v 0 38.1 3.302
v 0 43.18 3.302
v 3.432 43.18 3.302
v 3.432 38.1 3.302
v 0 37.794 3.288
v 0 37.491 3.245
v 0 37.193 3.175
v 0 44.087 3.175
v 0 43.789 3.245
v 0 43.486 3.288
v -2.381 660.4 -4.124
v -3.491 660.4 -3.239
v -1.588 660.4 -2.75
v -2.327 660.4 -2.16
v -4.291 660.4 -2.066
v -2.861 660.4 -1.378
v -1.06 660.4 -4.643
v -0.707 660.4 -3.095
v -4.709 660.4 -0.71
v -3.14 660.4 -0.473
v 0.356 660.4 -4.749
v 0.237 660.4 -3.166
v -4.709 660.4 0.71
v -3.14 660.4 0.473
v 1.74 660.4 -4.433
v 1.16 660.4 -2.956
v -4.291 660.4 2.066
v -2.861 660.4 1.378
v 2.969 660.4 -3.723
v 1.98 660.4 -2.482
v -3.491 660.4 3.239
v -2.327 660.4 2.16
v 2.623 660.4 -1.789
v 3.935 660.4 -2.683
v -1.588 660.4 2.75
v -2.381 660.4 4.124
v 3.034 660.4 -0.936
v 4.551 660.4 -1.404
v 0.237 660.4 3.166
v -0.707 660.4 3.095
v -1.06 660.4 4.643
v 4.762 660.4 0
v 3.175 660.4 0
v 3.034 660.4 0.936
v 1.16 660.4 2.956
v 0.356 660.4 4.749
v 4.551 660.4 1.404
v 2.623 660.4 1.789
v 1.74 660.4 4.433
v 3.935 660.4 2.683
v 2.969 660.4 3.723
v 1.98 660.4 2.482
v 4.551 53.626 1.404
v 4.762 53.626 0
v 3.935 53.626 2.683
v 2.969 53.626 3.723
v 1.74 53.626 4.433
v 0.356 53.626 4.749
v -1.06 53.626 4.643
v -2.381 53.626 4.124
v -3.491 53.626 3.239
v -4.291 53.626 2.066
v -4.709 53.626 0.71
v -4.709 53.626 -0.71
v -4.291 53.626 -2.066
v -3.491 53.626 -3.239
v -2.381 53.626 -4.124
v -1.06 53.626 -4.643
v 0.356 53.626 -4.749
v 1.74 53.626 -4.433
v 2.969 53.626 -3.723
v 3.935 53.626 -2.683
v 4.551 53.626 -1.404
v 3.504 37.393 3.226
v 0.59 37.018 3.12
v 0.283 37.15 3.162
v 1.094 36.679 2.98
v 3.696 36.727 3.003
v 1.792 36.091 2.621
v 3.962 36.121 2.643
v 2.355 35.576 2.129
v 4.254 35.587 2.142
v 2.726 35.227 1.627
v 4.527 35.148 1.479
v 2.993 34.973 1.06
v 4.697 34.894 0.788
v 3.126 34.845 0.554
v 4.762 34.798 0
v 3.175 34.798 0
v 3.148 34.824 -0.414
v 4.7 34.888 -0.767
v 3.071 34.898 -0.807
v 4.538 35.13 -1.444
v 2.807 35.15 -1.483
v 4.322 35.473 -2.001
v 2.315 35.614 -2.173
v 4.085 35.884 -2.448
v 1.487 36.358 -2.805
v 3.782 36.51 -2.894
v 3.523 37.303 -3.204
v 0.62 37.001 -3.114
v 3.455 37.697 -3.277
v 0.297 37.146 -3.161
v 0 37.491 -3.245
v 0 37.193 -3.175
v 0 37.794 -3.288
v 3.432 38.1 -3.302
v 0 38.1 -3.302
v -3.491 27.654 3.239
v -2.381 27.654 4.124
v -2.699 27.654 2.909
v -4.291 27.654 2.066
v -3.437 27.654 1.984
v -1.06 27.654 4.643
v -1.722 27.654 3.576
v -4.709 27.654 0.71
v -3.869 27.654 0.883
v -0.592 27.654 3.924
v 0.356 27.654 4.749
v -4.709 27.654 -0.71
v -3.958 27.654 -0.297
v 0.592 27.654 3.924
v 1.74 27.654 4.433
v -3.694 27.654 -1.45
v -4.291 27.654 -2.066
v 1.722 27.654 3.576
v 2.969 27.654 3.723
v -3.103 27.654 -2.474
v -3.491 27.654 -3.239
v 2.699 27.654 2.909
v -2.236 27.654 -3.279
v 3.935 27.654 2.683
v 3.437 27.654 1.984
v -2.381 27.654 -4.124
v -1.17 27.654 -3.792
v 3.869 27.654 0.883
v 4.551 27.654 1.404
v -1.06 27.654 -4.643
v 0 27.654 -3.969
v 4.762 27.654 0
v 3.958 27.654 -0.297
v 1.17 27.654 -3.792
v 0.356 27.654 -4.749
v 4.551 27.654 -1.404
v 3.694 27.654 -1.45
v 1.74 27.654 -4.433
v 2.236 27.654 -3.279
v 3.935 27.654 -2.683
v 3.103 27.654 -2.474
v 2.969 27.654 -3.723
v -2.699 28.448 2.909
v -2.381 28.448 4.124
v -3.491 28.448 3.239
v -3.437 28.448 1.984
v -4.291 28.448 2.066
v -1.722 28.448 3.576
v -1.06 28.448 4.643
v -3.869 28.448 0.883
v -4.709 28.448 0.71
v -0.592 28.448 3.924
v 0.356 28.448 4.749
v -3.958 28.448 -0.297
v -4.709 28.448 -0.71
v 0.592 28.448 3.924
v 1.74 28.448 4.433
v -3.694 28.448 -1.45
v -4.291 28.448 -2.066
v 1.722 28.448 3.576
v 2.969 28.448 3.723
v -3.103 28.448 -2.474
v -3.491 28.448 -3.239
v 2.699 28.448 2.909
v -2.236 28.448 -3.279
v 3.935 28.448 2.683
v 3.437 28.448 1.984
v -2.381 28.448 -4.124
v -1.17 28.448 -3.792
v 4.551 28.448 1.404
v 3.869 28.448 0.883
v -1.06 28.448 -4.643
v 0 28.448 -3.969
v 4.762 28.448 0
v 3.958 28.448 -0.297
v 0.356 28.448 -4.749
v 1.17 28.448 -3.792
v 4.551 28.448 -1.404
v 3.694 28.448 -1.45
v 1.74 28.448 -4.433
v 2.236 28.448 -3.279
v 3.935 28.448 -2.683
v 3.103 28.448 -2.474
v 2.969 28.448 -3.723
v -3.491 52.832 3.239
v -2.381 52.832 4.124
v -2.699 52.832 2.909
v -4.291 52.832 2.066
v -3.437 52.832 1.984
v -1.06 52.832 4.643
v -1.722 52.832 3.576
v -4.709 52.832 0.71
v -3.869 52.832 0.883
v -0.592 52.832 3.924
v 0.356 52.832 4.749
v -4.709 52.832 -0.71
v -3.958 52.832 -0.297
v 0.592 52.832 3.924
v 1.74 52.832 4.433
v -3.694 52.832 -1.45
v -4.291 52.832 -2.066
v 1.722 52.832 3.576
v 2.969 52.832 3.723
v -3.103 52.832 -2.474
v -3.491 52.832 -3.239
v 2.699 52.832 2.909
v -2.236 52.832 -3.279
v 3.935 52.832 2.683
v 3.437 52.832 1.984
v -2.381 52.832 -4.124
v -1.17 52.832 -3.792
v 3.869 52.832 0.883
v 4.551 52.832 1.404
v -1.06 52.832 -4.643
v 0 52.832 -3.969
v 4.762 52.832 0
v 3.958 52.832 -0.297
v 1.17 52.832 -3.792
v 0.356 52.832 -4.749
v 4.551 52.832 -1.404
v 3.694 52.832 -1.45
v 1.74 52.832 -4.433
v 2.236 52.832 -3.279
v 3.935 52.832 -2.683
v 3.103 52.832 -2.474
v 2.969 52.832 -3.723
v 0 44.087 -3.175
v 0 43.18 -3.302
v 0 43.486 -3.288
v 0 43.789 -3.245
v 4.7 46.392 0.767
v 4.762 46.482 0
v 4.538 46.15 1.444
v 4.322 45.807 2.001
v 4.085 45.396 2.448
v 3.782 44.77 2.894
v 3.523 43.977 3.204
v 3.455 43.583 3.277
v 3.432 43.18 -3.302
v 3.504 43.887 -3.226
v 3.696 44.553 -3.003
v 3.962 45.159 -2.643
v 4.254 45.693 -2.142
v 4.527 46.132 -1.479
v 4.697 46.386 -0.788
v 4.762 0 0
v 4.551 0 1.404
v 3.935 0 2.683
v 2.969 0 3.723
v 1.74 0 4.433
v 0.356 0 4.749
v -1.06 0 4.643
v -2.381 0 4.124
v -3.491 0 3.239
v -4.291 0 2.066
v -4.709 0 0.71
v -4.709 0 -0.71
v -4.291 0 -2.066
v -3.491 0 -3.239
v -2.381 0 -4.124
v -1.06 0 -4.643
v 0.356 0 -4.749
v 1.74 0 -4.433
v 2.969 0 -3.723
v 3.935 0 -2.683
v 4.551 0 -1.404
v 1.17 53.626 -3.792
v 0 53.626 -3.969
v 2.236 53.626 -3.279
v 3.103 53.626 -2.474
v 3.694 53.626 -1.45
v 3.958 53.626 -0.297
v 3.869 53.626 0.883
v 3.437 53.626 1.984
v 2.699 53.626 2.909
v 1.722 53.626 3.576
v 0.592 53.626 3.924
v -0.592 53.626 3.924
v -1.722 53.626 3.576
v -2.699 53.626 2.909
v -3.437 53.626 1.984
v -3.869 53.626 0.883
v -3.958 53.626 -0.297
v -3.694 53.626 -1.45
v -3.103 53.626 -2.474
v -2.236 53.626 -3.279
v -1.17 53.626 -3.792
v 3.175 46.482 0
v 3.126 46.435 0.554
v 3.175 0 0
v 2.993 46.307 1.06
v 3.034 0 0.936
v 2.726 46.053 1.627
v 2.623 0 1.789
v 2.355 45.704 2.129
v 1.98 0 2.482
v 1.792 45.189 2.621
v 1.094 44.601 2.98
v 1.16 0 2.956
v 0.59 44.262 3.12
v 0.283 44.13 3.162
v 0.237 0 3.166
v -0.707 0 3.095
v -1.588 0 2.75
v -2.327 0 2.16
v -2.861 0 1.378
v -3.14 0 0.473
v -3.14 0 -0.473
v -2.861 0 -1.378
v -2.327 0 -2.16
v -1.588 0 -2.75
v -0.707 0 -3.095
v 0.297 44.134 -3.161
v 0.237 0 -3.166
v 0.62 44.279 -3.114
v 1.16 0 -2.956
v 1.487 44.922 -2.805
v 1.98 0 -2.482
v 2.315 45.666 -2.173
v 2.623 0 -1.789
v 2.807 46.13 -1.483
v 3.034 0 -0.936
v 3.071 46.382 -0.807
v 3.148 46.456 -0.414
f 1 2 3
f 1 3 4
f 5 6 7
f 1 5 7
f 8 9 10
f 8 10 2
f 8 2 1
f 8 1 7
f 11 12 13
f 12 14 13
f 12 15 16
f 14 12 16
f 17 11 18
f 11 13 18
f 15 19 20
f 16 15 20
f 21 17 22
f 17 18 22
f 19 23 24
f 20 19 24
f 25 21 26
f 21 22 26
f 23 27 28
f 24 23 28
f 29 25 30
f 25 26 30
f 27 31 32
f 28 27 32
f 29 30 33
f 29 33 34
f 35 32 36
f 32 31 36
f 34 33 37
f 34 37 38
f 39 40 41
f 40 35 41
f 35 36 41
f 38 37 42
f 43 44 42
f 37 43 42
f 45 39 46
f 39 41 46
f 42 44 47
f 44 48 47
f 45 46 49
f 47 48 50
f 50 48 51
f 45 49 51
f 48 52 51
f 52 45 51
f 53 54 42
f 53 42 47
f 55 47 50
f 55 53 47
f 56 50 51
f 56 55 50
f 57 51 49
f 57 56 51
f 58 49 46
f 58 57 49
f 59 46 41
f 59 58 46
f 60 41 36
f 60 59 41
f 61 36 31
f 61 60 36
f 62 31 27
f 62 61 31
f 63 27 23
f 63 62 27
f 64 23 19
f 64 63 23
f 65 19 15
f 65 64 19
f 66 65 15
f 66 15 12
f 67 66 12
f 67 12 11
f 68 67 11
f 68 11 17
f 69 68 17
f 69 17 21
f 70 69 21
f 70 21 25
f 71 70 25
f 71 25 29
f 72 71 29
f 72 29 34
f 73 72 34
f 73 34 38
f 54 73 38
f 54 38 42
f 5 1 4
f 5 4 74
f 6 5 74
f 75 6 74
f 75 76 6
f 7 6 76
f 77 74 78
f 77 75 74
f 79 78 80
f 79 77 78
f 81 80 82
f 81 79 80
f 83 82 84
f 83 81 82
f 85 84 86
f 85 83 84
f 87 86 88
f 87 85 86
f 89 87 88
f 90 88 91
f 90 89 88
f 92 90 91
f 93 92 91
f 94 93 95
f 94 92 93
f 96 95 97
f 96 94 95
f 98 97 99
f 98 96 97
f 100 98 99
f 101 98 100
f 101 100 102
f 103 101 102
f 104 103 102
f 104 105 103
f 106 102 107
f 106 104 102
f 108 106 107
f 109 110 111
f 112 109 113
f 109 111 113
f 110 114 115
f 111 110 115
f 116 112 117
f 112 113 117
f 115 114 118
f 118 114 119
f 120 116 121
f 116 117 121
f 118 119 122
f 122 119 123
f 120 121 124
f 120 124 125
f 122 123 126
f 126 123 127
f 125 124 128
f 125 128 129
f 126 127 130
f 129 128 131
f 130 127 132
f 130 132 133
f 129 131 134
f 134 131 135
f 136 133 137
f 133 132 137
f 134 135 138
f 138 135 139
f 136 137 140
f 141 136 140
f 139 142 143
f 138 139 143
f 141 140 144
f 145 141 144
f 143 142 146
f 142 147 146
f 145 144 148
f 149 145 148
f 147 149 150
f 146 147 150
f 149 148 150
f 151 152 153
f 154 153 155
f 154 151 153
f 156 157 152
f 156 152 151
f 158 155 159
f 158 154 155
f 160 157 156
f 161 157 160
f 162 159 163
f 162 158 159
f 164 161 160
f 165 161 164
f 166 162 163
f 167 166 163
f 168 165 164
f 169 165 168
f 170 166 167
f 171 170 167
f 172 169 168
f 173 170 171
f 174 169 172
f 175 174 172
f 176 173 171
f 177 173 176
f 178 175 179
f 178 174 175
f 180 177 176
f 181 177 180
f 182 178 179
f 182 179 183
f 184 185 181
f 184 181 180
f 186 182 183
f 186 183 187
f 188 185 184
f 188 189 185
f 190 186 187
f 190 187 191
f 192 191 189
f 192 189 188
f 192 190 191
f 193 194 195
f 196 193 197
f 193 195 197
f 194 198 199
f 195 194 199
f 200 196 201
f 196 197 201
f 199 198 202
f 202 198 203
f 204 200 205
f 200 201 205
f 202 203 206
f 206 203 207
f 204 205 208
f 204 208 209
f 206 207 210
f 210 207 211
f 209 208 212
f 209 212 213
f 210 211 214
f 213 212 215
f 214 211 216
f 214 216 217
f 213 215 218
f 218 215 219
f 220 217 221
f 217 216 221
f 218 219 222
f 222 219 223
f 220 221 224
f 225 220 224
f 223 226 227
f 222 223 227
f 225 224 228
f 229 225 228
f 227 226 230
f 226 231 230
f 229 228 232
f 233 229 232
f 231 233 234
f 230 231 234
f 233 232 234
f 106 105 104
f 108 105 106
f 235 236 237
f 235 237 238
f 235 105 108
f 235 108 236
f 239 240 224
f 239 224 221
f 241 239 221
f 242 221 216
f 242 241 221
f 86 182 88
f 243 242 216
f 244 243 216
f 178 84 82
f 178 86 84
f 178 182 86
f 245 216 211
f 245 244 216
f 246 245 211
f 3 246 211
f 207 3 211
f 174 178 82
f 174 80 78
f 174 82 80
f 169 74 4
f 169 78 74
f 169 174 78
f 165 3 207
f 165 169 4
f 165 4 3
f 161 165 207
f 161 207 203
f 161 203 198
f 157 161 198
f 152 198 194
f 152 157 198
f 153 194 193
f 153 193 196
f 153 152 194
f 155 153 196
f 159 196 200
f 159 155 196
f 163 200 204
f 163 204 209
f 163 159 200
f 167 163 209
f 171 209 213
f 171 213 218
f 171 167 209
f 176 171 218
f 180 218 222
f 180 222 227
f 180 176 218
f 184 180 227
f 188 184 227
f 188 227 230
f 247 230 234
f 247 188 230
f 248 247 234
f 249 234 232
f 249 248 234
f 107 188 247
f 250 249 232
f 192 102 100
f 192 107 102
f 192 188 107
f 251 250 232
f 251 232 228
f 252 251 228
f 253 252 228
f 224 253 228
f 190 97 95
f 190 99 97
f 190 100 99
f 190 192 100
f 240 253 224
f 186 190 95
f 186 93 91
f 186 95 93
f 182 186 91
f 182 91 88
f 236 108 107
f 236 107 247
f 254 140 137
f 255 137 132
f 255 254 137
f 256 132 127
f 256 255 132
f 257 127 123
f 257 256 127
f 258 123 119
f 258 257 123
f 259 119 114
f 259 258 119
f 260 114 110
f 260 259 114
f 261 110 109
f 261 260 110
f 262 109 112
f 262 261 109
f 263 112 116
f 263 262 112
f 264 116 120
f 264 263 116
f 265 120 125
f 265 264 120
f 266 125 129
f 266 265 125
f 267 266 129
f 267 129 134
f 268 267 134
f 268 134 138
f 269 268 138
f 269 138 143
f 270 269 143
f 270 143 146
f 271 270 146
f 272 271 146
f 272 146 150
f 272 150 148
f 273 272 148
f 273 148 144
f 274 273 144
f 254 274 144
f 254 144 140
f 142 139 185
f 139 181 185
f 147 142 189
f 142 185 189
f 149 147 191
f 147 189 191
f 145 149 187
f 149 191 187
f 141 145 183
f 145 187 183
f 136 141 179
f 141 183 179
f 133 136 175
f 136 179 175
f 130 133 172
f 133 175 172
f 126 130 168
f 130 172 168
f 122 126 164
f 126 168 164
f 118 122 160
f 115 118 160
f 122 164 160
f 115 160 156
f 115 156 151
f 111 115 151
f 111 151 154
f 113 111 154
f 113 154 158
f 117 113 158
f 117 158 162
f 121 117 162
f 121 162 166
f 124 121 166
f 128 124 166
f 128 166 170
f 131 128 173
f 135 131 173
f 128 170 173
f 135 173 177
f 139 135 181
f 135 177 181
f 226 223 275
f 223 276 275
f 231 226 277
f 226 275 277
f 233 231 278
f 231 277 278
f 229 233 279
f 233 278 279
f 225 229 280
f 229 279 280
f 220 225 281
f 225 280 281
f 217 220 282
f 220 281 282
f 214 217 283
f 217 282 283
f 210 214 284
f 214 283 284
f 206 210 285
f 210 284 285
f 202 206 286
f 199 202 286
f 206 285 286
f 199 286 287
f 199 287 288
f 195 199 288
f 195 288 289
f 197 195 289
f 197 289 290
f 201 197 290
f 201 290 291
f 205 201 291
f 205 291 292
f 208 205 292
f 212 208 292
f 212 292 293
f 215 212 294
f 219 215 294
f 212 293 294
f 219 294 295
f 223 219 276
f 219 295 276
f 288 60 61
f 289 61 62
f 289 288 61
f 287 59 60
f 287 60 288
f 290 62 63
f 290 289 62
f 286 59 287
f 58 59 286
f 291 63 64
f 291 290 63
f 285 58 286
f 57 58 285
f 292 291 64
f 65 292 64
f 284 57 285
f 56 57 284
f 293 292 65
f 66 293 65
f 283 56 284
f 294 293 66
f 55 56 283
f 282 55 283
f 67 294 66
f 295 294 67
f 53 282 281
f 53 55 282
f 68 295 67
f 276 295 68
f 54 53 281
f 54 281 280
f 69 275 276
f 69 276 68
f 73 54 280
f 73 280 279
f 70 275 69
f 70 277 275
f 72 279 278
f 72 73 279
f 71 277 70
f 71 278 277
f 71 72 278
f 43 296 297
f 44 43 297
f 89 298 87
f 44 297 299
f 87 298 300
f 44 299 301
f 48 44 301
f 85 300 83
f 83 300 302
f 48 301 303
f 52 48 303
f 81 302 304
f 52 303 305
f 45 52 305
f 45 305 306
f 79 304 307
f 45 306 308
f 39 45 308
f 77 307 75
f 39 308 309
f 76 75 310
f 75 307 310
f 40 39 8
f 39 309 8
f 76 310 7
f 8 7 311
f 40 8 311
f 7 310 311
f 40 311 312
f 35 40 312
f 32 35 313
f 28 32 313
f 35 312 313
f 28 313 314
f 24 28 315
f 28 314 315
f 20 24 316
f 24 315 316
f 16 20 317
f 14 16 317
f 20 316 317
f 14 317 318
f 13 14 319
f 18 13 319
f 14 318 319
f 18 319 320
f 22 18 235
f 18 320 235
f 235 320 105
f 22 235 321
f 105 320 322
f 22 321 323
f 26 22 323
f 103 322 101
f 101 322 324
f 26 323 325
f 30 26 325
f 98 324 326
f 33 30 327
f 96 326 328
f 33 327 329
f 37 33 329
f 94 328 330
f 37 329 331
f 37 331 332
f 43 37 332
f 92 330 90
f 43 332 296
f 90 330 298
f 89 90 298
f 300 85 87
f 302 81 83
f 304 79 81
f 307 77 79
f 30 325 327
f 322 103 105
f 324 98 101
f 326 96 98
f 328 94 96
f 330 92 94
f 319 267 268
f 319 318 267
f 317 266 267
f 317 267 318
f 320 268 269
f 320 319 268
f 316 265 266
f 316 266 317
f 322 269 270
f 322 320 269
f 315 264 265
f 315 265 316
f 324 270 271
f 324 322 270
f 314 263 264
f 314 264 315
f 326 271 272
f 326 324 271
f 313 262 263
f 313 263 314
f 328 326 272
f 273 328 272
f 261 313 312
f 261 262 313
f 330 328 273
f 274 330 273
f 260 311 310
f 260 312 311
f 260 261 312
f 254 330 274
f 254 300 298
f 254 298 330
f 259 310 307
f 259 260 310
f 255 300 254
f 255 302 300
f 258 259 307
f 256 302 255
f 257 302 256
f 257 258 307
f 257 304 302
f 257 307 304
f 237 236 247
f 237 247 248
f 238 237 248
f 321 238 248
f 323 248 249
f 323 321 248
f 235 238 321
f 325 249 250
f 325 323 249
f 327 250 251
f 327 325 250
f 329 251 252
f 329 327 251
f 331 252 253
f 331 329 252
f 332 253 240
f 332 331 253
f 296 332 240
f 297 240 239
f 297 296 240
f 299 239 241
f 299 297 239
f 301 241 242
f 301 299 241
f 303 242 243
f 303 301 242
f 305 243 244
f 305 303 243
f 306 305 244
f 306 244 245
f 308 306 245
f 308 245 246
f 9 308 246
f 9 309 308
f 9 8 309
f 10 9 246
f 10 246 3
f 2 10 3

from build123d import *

# Parameters (mm, degrees)
F0_R     = 4.7625
F0_R_2   = 3.175
F1_DEPTH = 660.4
F3_DEPTH = 25.4
F4_W     = 0.79375
F4_H     = 0.79375


with BuildPart() as f1:
    # F0 (on Front) → F1 (new body)
    with BuildSketch(Plane.XZ):
        Circle(F0_R)
        Circle(F0_R_2, mode=Mode.SUBTRACT)
    extrude(amount=-F1_DEPTH)

    # F2 (on Right) → F3 (cut)
    with BuildSketch(Plane.YZ):
        with BuildLine():
            Line((43.18, 3.302), (38.1, 3.302))
            ThreePointArc((38.1, 3.302), (34.798, 0), (38.1, -3.302))
            Line((38.1, -3.302), (43.18, -3.302))
            ThreePointArc((43.18, -3.302), (46.482, 0), (43.18, 3.302))
        make_face()
    extrude(amount=F3_DEPTH, mode=Mode.SUBTRACT)

    # F4 (on Right) → F5 (revolve, cut)
    with BuildSketch(Plane.YZ):
        with Locations((28.051125, -4.365625)):
            Rectangle(F4_W, F4_H)
        with Locations((53.228875, -4.365625)):
            Rectangle(F4_W, F4_H)
    revolve(axis=Axis((0, 0, 0), (0, -1, 0)), mode=Mode.SUBTRACT)


solid = f1.part
